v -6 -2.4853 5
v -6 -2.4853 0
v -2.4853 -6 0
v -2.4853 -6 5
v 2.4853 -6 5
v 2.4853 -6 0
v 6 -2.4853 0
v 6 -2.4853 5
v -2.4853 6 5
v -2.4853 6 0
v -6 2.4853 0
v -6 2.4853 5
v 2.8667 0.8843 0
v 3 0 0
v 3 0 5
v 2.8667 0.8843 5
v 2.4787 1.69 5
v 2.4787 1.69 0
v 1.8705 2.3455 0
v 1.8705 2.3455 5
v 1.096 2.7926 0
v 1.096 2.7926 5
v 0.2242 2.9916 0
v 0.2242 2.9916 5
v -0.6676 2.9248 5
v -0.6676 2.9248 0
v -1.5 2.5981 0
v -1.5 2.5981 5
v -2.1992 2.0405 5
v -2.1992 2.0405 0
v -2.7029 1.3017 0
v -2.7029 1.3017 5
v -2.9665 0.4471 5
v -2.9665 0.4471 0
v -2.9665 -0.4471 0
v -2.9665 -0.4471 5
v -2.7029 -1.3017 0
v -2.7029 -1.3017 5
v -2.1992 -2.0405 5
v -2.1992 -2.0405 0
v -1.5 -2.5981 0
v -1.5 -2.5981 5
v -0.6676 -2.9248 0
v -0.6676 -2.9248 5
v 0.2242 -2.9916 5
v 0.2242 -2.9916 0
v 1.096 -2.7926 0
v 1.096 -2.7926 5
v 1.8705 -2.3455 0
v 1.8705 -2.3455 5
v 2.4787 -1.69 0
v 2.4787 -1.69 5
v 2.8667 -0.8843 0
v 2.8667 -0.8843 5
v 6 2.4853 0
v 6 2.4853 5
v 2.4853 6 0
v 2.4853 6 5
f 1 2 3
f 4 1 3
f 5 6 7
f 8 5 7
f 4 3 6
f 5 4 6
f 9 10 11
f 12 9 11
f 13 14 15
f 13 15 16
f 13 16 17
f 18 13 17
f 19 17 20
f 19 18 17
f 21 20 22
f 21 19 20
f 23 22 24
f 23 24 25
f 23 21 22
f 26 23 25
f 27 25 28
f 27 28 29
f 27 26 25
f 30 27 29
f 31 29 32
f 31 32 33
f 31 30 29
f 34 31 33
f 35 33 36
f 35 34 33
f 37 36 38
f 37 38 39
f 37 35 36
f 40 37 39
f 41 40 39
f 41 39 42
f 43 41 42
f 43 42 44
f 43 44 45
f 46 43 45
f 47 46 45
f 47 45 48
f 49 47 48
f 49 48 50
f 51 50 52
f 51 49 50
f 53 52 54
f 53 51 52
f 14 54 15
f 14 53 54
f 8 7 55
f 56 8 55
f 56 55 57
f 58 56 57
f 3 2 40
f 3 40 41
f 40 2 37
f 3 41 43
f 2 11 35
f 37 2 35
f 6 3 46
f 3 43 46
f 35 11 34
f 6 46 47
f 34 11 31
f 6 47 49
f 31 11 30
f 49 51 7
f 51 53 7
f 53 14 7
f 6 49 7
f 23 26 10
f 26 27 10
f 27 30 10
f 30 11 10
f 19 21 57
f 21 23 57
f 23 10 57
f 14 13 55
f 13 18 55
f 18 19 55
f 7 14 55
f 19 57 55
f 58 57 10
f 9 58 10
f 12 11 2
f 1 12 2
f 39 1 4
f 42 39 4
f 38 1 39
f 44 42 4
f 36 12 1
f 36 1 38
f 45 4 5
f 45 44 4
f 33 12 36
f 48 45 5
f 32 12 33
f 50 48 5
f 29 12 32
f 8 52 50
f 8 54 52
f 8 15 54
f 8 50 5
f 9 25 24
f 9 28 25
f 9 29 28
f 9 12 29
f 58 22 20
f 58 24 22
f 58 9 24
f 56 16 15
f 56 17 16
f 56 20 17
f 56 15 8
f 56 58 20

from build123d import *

# Parameters (mm, degrees)
ESQUISSE1_R        = 3
BOSS_EXTRU_1_DEPTH = 5


with BuildPart() as part:
    # Esquisse1 → Boss.-Extru.1 (new body)
    with BuildSketch(Plane.XY):
        Polygon((-2.485281374, 6), (-4.242640687, 4.242640687), (-6, 2.485281374), (-6, 0), (-6, -2.485281374), (-4.242640687, -4.242640687), (-2.485281374, -6), (2.485281374, -6), (4.242640687, -4.242640687), (6, -2.485281374), (6, 2.485281374), (4.242640687, 4.242640687), (2.485281374, 6), align=None)
        Circle(ESQUISSE1_R, mode=Mode.SUBTRACT)
    extrude(amount=BOSS_EXTRU_1_DEPTH)


solid = part.part
